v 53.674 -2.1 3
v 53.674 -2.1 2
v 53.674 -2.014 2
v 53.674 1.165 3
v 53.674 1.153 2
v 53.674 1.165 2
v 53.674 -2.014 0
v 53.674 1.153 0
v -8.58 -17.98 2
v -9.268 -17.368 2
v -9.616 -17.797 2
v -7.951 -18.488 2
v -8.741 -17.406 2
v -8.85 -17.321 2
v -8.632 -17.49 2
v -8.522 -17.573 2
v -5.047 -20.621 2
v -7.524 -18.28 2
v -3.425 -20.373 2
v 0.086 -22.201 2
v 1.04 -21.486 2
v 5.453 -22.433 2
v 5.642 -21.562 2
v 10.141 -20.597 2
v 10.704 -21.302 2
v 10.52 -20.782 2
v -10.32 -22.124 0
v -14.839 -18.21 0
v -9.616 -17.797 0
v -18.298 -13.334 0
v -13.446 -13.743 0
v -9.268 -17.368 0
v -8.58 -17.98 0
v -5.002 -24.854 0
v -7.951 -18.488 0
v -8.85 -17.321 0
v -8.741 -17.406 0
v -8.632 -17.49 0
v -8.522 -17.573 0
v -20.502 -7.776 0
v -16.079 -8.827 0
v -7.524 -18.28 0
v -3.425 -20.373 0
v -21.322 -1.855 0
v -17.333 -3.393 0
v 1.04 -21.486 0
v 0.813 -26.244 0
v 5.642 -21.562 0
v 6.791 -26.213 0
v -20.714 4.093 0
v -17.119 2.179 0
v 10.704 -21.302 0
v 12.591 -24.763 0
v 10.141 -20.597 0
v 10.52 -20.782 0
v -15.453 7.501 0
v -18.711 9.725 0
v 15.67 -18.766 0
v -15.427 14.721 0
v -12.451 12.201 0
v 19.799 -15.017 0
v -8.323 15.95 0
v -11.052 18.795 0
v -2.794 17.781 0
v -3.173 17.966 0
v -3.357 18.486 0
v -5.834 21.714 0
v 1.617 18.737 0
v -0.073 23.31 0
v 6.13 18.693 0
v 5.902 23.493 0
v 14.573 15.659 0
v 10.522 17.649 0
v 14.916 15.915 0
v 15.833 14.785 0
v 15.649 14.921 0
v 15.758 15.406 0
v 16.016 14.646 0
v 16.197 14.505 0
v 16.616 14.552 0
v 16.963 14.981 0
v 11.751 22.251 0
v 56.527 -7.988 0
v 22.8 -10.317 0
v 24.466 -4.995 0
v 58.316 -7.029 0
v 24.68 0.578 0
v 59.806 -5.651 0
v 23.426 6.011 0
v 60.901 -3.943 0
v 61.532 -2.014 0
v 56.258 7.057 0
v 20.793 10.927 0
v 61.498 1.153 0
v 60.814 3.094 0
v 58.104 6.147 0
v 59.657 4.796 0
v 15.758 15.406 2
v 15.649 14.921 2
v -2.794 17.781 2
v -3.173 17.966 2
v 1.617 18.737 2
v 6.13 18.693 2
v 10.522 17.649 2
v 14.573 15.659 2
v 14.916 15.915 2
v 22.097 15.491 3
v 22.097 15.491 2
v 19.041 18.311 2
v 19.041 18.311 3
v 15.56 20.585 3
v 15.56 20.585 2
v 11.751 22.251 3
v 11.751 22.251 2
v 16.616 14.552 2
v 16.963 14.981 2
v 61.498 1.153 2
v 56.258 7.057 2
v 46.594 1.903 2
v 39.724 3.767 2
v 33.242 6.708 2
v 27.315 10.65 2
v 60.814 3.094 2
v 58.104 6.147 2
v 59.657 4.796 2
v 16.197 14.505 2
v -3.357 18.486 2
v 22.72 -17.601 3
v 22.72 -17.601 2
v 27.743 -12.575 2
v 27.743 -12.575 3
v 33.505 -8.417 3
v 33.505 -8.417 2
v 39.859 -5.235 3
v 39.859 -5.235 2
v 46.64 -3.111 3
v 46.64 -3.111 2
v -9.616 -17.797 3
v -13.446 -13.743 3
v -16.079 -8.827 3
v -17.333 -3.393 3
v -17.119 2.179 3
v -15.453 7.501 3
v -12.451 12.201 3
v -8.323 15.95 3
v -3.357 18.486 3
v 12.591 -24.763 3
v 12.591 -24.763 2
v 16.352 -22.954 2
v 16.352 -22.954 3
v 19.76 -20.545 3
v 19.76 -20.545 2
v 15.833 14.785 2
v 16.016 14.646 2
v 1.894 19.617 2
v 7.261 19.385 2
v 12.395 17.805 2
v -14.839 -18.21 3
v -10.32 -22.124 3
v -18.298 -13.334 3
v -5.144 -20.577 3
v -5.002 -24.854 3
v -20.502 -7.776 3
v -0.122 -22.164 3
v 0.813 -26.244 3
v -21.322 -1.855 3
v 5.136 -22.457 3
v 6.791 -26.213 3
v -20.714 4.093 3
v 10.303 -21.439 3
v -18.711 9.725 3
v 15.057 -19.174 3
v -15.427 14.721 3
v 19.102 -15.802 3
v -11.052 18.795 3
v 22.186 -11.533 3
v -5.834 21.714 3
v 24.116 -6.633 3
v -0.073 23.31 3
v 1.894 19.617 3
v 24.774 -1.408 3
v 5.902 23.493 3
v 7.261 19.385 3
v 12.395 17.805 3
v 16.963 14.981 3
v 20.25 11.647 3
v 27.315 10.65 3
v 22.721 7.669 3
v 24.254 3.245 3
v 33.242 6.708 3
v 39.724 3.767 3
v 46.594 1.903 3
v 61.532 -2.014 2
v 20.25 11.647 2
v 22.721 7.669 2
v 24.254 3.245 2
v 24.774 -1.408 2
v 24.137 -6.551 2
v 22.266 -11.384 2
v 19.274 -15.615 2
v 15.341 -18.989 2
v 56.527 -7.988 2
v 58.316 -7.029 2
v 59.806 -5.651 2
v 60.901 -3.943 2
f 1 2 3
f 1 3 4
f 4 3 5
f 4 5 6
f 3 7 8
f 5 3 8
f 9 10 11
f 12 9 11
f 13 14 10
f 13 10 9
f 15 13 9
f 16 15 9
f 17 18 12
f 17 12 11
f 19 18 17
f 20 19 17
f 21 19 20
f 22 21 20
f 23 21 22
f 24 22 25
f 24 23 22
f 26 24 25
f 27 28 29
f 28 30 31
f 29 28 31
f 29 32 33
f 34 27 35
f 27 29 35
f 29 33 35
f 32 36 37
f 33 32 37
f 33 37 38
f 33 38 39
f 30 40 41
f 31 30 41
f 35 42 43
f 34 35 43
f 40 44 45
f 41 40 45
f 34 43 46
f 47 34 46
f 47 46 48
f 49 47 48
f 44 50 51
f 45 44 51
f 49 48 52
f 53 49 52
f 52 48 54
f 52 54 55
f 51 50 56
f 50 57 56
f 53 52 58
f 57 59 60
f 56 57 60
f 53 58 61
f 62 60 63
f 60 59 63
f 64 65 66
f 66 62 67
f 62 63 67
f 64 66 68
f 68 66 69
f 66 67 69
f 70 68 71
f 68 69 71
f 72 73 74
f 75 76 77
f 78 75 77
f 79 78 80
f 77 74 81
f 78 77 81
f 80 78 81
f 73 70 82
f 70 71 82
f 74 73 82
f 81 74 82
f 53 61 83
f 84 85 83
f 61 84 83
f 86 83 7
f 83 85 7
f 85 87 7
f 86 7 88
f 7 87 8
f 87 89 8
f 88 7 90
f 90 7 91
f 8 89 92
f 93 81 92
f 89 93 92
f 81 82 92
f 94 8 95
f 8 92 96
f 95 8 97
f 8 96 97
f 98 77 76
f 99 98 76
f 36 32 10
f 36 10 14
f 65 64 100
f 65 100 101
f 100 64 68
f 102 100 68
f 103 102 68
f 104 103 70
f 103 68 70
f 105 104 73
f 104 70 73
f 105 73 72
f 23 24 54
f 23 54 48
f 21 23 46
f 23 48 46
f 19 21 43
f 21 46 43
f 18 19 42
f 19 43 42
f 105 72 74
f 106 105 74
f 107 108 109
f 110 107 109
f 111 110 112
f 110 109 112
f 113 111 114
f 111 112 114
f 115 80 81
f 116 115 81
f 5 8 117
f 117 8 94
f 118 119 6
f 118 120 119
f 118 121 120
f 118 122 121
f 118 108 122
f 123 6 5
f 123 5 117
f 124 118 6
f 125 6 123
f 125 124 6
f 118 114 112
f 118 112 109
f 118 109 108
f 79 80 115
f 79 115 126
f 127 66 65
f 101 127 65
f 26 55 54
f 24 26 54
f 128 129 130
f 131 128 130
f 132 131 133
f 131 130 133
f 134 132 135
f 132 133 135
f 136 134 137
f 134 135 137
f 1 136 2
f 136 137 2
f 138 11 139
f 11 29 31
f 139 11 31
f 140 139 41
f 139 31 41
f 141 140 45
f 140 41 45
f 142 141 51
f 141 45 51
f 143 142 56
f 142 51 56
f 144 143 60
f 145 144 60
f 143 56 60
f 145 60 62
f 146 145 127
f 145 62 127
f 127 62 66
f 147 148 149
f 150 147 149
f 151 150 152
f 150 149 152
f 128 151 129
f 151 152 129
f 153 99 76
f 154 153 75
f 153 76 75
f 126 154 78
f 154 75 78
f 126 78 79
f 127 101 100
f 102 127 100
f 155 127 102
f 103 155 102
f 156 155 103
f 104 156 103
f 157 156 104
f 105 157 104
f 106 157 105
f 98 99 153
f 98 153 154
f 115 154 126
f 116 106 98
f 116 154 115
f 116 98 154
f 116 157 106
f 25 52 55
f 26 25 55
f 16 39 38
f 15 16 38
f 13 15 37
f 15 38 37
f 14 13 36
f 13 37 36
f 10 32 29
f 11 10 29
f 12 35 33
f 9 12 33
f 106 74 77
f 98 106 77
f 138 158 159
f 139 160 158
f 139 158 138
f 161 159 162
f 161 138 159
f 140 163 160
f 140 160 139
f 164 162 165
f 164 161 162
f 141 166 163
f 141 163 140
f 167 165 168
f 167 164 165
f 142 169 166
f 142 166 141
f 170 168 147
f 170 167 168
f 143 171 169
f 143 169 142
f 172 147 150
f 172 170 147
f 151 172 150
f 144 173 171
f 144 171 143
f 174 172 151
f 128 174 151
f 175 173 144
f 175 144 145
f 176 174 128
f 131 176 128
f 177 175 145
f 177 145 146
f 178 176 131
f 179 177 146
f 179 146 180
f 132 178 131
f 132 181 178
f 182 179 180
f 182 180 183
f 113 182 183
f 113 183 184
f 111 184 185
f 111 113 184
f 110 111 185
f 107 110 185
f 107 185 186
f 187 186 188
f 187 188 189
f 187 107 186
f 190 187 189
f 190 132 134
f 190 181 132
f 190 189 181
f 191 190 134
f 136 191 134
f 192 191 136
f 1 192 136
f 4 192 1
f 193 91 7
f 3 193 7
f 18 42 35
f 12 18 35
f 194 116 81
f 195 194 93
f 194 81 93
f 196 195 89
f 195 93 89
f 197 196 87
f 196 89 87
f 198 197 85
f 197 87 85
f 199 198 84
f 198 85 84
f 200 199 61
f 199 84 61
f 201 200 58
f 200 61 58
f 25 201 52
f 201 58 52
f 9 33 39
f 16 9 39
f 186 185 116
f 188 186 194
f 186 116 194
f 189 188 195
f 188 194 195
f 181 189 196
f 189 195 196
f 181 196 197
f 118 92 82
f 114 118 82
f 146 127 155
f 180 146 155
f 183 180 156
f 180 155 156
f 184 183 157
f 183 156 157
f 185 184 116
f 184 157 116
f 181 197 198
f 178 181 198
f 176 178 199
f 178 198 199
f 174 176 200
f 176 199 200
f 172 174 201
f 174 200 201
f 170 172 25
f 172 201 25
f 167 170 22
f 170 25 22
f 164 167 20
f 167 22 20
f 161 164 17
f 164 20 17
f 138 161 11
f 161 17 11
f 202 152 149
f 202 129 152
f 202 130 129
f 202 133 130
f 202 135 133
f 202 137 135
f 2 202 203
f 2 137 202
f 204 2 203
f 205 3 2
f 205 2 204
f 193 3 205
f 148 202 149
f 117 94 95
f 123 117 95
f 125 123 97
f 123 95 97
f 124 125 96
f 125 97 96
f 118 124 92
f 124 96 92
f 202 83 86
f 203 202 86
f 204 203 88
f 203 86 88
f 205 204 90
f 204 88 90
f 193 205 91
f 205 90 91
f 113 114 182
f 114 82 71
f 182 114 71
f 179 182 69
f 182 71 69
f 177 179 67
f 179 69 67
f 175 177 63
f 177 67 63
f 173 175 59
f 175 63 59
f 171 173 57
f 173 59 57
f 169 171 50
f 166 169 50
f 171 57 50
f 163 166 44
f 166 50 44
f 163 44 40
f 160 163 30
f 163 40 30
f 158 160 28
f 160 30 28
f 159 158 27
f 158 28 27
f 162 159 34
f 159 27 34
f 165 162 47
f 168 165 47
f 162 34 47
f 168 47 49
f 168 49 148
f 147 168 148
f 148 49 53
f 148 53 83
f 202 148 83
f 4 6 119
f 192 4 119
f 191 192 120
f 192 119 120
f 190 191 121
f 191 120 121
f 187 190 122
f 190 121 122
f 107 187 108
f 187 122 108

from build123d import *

# Parameters (mm, degrees)
F1_DEPTH    = 2
F3_DEPTH    = 1
F5_DEPTH    = 25
F6_T1_DEPTH = 3.532364341


# Not quite as in the source:
# - a fillet or chamfer that OpenCascade refuses, or shapes differently, is made with other operations: its cross-section is extruded or revolved along the edge and cut away or added


with BuildPart() as f1:
    # F0 (on Top) → F1 (new body)
    with BuildSketch(Plane.XY):
        with BuildLine():
            Line((56.2581913165, 7.0569766727), (11.7505642065, 22.2513897102))
            ThreePointArc((11.7505642065, 22.2513897102), (-21.3224604142, -1.8547742058), (12.5910944331, -24.7633510695))
            Line((12.5910944331, -24.7633510695), (56.5271609891, -7.9877403768))
            ThreePointArc((56.5271609891, -7.9877403768), (59.80596685, -5.6514457625), (61.5316564147, -2.0140241586))
            Line((61.5316564147, -2.0140241586), (53.6735452507, -2.0140241586))
            Line((53.6735452507, -2.0140241586), (53.6735452507, 1.1534155326))
            Line((53.6735452507, 1.1534155326), (61.4978499313, 1.1534155326))
            ThreePointArc((61.4978499313, 1.1534155326), (59.6568196422, 4.7964129612), (56.2581913165, 7.0569766727))
        make_face()
        with BuildLine():
            ThreePointArc((-9.6162715523, -17.7966343508), (-17.1193131366, 2.1791704159), (-3.3569313702, 18.4863852979))
            Line((-3.3569313702, 18.4863852979), (-3.0737131177, 17.6849569346))
            ThreePointArc((-3.0737131177, 17.6849569346), (7.1161082705, 18.5473361415), (16.4279902868, 14.3206339835))
            Line((16.4279902868, 14.3206339835), (16.9633620538, 14.9808438525))
            ThreePointArc((16.9633620538, 14.9808438525), (24.466403638, -4.9949609142), (10.7040218716, -21.3021757961))
            Line((10.7040218716, -21.3021757961), (10.4208036191, -20.5007474329))
            ThreePointArc((10.4208036191, -20.5007474329), (0.2309822309, -21.3631266398), (-9.0808997854, -17.1364244817))
            Line((-9.0808997854, -17.1364244817), (-9.6162715523, -17.7966343508))
        make_face(mode=Mode.SUBTRACT)
    extrude(amount=F1_DEPTH)

    # F2 (on face) → F3 (join)
    with BuildSketch(Plane.XY.offset(2)):
        with BuildLine():
            ThreePointArc((53.6735452507, 1.1654510324), (36.4234102314, 5.106684653), (22.0966452002, 15.4914949248))
            ThreePointArc((22.0966452002, 15.4914949248), (17.3479051946, 19.5208381125), (11.7505642065, 22.2513897102))
            ThreePointArc((11.7505642065, 22.2513897102), (-21.3224604142, -1.8547742058), (12.5910944331, -24.7633510695))
            ThreePointArc((12.5910944331, -24.7633510695), (18.1068462898, -21.8206319867), (22.7200407832, -17.6014435919))
            ThreePointArc((22.7200407832, -17.6014435919), (36.6180007946, -6.6981986771), (53.6735452507, -2.100107176))
            Line((53.6735452507, -2.100107176), (53.6735452507, -2.0140241586))
            Line((53.6735452507, -2.0140241586), (53.6735452507, 1.1534155326))
            Line((53.6735452507, 1.1534155326), (53.6735452507, 1.1654510324))
        make_face()
        with BuildLine():
            ThreePointArc((16.9633620538, 14.9808438525), (22.7211846654, 7.6694079147), (24.7735452507, -1.4078952491))
            ThreePointArc((24.7735452507, -1.4078952491), (20.9007484001, -13.591222859), (10.7040218716, -21.3021757961))
            ThreePointArc((10.7040218716, -21.3021757961), (0.0864795857, -22.2007536364), (-9.6162715523, -17.7966343508))
            ThreePointArc((-9.6162715523, -17.7966343508), (-17.1193131366, 2.1791704159), (-3.3569313702, 18.4863852979))
            ThreePointArc((-3.3569313702, 18.4863852979), (7.2606109157, 19.3849631382), (16.9633620538, 14.9808438525))
        make_face(mode=Mode.SUBTRACT)
    extrude(amount=F3_DEPTH)

    # F4 (on face) → F5 (cut)
    with BuildSketch(Plane(origin=(0, 0, 0), x_dir=(1, 0, 0), z_dir=(0, 0, -1))):
        Polygon((-8.5801632286, 17.98029692), (-8.4723387845, 17.2191802412), (-7.1583543904, 18.1015189737), (-7.951295166, 18.4884736217), align=None)
        Polygon((15.7582396641, -15.4063906521), (15.5428694561, -14.4470129162), (14.0254860744, -15.2497580275), (14.9163370952, -15.9154478461), align=None)
    extrude(amount=-F5_DEPTH, mode=Mode.SUBTRACT)

    # F6: chamfer of 0.3 on 4 edges, made by hand

    # F6_s2 → F6_t1 (cut)
    with BuildSketch(Plane.XY.offset(-0.7661821705)):
        with BuildLine():
            Line((-9.2684752215, -17.3677387978), (-8.8499270506, -17.3209446589))
            ThreePointArc((-8.8499270506, -17.3209446589), (-8.9624343354, -17.2317544465), (-9.0808997854, -17.1364244817))
            Line((-9.0808997854, -17.1364244817), (-9.2684752215, -17.3677387978))
        make_face()
        with BuildLine():
            Line((10.5200333329, -20.7815397421), (10.1413568327, -20.5972129374))
            ThreePointArc((10.1413568327, -20.5972129374), (10.2772447573, -20.5508744537), (10.4208036191, -20.5007474329))
            Line((10.4208036191, -20.5007474329), (10.5200333329, -20.7815397421))
        make_face()
        with BuildLine():
            Line((16.6155657229, 14.5519482995), (16.197017552, 14.5051541606))
            ThreePointArc((16.197017552, 14.5051541606), (16.3095248368, 14.4159639483), (16.4279902868, 14.3206339835))
            Line((16.4279902868, 14.3206339835), (16.6155657229, 14.5519482995))
        make_face()
        with BuildLine():
            Line((-2.7942663313, 17.7814224391), (-3.1729428315, 17.9657492438))
            Line((-3.1729428315, 17.9657492438), (-3.0737131177, 17.6849569346))
            ThreePointArc((-3.0737131177, 17.6849569346), (-2.9301542559, 17.7350839554), (-2.7942663313, 17.7814224391))
        make_face()
    extrude(amount=F6_T1_DEPTH, mode=Mode.SUBTRACT)


solid = f1.part
